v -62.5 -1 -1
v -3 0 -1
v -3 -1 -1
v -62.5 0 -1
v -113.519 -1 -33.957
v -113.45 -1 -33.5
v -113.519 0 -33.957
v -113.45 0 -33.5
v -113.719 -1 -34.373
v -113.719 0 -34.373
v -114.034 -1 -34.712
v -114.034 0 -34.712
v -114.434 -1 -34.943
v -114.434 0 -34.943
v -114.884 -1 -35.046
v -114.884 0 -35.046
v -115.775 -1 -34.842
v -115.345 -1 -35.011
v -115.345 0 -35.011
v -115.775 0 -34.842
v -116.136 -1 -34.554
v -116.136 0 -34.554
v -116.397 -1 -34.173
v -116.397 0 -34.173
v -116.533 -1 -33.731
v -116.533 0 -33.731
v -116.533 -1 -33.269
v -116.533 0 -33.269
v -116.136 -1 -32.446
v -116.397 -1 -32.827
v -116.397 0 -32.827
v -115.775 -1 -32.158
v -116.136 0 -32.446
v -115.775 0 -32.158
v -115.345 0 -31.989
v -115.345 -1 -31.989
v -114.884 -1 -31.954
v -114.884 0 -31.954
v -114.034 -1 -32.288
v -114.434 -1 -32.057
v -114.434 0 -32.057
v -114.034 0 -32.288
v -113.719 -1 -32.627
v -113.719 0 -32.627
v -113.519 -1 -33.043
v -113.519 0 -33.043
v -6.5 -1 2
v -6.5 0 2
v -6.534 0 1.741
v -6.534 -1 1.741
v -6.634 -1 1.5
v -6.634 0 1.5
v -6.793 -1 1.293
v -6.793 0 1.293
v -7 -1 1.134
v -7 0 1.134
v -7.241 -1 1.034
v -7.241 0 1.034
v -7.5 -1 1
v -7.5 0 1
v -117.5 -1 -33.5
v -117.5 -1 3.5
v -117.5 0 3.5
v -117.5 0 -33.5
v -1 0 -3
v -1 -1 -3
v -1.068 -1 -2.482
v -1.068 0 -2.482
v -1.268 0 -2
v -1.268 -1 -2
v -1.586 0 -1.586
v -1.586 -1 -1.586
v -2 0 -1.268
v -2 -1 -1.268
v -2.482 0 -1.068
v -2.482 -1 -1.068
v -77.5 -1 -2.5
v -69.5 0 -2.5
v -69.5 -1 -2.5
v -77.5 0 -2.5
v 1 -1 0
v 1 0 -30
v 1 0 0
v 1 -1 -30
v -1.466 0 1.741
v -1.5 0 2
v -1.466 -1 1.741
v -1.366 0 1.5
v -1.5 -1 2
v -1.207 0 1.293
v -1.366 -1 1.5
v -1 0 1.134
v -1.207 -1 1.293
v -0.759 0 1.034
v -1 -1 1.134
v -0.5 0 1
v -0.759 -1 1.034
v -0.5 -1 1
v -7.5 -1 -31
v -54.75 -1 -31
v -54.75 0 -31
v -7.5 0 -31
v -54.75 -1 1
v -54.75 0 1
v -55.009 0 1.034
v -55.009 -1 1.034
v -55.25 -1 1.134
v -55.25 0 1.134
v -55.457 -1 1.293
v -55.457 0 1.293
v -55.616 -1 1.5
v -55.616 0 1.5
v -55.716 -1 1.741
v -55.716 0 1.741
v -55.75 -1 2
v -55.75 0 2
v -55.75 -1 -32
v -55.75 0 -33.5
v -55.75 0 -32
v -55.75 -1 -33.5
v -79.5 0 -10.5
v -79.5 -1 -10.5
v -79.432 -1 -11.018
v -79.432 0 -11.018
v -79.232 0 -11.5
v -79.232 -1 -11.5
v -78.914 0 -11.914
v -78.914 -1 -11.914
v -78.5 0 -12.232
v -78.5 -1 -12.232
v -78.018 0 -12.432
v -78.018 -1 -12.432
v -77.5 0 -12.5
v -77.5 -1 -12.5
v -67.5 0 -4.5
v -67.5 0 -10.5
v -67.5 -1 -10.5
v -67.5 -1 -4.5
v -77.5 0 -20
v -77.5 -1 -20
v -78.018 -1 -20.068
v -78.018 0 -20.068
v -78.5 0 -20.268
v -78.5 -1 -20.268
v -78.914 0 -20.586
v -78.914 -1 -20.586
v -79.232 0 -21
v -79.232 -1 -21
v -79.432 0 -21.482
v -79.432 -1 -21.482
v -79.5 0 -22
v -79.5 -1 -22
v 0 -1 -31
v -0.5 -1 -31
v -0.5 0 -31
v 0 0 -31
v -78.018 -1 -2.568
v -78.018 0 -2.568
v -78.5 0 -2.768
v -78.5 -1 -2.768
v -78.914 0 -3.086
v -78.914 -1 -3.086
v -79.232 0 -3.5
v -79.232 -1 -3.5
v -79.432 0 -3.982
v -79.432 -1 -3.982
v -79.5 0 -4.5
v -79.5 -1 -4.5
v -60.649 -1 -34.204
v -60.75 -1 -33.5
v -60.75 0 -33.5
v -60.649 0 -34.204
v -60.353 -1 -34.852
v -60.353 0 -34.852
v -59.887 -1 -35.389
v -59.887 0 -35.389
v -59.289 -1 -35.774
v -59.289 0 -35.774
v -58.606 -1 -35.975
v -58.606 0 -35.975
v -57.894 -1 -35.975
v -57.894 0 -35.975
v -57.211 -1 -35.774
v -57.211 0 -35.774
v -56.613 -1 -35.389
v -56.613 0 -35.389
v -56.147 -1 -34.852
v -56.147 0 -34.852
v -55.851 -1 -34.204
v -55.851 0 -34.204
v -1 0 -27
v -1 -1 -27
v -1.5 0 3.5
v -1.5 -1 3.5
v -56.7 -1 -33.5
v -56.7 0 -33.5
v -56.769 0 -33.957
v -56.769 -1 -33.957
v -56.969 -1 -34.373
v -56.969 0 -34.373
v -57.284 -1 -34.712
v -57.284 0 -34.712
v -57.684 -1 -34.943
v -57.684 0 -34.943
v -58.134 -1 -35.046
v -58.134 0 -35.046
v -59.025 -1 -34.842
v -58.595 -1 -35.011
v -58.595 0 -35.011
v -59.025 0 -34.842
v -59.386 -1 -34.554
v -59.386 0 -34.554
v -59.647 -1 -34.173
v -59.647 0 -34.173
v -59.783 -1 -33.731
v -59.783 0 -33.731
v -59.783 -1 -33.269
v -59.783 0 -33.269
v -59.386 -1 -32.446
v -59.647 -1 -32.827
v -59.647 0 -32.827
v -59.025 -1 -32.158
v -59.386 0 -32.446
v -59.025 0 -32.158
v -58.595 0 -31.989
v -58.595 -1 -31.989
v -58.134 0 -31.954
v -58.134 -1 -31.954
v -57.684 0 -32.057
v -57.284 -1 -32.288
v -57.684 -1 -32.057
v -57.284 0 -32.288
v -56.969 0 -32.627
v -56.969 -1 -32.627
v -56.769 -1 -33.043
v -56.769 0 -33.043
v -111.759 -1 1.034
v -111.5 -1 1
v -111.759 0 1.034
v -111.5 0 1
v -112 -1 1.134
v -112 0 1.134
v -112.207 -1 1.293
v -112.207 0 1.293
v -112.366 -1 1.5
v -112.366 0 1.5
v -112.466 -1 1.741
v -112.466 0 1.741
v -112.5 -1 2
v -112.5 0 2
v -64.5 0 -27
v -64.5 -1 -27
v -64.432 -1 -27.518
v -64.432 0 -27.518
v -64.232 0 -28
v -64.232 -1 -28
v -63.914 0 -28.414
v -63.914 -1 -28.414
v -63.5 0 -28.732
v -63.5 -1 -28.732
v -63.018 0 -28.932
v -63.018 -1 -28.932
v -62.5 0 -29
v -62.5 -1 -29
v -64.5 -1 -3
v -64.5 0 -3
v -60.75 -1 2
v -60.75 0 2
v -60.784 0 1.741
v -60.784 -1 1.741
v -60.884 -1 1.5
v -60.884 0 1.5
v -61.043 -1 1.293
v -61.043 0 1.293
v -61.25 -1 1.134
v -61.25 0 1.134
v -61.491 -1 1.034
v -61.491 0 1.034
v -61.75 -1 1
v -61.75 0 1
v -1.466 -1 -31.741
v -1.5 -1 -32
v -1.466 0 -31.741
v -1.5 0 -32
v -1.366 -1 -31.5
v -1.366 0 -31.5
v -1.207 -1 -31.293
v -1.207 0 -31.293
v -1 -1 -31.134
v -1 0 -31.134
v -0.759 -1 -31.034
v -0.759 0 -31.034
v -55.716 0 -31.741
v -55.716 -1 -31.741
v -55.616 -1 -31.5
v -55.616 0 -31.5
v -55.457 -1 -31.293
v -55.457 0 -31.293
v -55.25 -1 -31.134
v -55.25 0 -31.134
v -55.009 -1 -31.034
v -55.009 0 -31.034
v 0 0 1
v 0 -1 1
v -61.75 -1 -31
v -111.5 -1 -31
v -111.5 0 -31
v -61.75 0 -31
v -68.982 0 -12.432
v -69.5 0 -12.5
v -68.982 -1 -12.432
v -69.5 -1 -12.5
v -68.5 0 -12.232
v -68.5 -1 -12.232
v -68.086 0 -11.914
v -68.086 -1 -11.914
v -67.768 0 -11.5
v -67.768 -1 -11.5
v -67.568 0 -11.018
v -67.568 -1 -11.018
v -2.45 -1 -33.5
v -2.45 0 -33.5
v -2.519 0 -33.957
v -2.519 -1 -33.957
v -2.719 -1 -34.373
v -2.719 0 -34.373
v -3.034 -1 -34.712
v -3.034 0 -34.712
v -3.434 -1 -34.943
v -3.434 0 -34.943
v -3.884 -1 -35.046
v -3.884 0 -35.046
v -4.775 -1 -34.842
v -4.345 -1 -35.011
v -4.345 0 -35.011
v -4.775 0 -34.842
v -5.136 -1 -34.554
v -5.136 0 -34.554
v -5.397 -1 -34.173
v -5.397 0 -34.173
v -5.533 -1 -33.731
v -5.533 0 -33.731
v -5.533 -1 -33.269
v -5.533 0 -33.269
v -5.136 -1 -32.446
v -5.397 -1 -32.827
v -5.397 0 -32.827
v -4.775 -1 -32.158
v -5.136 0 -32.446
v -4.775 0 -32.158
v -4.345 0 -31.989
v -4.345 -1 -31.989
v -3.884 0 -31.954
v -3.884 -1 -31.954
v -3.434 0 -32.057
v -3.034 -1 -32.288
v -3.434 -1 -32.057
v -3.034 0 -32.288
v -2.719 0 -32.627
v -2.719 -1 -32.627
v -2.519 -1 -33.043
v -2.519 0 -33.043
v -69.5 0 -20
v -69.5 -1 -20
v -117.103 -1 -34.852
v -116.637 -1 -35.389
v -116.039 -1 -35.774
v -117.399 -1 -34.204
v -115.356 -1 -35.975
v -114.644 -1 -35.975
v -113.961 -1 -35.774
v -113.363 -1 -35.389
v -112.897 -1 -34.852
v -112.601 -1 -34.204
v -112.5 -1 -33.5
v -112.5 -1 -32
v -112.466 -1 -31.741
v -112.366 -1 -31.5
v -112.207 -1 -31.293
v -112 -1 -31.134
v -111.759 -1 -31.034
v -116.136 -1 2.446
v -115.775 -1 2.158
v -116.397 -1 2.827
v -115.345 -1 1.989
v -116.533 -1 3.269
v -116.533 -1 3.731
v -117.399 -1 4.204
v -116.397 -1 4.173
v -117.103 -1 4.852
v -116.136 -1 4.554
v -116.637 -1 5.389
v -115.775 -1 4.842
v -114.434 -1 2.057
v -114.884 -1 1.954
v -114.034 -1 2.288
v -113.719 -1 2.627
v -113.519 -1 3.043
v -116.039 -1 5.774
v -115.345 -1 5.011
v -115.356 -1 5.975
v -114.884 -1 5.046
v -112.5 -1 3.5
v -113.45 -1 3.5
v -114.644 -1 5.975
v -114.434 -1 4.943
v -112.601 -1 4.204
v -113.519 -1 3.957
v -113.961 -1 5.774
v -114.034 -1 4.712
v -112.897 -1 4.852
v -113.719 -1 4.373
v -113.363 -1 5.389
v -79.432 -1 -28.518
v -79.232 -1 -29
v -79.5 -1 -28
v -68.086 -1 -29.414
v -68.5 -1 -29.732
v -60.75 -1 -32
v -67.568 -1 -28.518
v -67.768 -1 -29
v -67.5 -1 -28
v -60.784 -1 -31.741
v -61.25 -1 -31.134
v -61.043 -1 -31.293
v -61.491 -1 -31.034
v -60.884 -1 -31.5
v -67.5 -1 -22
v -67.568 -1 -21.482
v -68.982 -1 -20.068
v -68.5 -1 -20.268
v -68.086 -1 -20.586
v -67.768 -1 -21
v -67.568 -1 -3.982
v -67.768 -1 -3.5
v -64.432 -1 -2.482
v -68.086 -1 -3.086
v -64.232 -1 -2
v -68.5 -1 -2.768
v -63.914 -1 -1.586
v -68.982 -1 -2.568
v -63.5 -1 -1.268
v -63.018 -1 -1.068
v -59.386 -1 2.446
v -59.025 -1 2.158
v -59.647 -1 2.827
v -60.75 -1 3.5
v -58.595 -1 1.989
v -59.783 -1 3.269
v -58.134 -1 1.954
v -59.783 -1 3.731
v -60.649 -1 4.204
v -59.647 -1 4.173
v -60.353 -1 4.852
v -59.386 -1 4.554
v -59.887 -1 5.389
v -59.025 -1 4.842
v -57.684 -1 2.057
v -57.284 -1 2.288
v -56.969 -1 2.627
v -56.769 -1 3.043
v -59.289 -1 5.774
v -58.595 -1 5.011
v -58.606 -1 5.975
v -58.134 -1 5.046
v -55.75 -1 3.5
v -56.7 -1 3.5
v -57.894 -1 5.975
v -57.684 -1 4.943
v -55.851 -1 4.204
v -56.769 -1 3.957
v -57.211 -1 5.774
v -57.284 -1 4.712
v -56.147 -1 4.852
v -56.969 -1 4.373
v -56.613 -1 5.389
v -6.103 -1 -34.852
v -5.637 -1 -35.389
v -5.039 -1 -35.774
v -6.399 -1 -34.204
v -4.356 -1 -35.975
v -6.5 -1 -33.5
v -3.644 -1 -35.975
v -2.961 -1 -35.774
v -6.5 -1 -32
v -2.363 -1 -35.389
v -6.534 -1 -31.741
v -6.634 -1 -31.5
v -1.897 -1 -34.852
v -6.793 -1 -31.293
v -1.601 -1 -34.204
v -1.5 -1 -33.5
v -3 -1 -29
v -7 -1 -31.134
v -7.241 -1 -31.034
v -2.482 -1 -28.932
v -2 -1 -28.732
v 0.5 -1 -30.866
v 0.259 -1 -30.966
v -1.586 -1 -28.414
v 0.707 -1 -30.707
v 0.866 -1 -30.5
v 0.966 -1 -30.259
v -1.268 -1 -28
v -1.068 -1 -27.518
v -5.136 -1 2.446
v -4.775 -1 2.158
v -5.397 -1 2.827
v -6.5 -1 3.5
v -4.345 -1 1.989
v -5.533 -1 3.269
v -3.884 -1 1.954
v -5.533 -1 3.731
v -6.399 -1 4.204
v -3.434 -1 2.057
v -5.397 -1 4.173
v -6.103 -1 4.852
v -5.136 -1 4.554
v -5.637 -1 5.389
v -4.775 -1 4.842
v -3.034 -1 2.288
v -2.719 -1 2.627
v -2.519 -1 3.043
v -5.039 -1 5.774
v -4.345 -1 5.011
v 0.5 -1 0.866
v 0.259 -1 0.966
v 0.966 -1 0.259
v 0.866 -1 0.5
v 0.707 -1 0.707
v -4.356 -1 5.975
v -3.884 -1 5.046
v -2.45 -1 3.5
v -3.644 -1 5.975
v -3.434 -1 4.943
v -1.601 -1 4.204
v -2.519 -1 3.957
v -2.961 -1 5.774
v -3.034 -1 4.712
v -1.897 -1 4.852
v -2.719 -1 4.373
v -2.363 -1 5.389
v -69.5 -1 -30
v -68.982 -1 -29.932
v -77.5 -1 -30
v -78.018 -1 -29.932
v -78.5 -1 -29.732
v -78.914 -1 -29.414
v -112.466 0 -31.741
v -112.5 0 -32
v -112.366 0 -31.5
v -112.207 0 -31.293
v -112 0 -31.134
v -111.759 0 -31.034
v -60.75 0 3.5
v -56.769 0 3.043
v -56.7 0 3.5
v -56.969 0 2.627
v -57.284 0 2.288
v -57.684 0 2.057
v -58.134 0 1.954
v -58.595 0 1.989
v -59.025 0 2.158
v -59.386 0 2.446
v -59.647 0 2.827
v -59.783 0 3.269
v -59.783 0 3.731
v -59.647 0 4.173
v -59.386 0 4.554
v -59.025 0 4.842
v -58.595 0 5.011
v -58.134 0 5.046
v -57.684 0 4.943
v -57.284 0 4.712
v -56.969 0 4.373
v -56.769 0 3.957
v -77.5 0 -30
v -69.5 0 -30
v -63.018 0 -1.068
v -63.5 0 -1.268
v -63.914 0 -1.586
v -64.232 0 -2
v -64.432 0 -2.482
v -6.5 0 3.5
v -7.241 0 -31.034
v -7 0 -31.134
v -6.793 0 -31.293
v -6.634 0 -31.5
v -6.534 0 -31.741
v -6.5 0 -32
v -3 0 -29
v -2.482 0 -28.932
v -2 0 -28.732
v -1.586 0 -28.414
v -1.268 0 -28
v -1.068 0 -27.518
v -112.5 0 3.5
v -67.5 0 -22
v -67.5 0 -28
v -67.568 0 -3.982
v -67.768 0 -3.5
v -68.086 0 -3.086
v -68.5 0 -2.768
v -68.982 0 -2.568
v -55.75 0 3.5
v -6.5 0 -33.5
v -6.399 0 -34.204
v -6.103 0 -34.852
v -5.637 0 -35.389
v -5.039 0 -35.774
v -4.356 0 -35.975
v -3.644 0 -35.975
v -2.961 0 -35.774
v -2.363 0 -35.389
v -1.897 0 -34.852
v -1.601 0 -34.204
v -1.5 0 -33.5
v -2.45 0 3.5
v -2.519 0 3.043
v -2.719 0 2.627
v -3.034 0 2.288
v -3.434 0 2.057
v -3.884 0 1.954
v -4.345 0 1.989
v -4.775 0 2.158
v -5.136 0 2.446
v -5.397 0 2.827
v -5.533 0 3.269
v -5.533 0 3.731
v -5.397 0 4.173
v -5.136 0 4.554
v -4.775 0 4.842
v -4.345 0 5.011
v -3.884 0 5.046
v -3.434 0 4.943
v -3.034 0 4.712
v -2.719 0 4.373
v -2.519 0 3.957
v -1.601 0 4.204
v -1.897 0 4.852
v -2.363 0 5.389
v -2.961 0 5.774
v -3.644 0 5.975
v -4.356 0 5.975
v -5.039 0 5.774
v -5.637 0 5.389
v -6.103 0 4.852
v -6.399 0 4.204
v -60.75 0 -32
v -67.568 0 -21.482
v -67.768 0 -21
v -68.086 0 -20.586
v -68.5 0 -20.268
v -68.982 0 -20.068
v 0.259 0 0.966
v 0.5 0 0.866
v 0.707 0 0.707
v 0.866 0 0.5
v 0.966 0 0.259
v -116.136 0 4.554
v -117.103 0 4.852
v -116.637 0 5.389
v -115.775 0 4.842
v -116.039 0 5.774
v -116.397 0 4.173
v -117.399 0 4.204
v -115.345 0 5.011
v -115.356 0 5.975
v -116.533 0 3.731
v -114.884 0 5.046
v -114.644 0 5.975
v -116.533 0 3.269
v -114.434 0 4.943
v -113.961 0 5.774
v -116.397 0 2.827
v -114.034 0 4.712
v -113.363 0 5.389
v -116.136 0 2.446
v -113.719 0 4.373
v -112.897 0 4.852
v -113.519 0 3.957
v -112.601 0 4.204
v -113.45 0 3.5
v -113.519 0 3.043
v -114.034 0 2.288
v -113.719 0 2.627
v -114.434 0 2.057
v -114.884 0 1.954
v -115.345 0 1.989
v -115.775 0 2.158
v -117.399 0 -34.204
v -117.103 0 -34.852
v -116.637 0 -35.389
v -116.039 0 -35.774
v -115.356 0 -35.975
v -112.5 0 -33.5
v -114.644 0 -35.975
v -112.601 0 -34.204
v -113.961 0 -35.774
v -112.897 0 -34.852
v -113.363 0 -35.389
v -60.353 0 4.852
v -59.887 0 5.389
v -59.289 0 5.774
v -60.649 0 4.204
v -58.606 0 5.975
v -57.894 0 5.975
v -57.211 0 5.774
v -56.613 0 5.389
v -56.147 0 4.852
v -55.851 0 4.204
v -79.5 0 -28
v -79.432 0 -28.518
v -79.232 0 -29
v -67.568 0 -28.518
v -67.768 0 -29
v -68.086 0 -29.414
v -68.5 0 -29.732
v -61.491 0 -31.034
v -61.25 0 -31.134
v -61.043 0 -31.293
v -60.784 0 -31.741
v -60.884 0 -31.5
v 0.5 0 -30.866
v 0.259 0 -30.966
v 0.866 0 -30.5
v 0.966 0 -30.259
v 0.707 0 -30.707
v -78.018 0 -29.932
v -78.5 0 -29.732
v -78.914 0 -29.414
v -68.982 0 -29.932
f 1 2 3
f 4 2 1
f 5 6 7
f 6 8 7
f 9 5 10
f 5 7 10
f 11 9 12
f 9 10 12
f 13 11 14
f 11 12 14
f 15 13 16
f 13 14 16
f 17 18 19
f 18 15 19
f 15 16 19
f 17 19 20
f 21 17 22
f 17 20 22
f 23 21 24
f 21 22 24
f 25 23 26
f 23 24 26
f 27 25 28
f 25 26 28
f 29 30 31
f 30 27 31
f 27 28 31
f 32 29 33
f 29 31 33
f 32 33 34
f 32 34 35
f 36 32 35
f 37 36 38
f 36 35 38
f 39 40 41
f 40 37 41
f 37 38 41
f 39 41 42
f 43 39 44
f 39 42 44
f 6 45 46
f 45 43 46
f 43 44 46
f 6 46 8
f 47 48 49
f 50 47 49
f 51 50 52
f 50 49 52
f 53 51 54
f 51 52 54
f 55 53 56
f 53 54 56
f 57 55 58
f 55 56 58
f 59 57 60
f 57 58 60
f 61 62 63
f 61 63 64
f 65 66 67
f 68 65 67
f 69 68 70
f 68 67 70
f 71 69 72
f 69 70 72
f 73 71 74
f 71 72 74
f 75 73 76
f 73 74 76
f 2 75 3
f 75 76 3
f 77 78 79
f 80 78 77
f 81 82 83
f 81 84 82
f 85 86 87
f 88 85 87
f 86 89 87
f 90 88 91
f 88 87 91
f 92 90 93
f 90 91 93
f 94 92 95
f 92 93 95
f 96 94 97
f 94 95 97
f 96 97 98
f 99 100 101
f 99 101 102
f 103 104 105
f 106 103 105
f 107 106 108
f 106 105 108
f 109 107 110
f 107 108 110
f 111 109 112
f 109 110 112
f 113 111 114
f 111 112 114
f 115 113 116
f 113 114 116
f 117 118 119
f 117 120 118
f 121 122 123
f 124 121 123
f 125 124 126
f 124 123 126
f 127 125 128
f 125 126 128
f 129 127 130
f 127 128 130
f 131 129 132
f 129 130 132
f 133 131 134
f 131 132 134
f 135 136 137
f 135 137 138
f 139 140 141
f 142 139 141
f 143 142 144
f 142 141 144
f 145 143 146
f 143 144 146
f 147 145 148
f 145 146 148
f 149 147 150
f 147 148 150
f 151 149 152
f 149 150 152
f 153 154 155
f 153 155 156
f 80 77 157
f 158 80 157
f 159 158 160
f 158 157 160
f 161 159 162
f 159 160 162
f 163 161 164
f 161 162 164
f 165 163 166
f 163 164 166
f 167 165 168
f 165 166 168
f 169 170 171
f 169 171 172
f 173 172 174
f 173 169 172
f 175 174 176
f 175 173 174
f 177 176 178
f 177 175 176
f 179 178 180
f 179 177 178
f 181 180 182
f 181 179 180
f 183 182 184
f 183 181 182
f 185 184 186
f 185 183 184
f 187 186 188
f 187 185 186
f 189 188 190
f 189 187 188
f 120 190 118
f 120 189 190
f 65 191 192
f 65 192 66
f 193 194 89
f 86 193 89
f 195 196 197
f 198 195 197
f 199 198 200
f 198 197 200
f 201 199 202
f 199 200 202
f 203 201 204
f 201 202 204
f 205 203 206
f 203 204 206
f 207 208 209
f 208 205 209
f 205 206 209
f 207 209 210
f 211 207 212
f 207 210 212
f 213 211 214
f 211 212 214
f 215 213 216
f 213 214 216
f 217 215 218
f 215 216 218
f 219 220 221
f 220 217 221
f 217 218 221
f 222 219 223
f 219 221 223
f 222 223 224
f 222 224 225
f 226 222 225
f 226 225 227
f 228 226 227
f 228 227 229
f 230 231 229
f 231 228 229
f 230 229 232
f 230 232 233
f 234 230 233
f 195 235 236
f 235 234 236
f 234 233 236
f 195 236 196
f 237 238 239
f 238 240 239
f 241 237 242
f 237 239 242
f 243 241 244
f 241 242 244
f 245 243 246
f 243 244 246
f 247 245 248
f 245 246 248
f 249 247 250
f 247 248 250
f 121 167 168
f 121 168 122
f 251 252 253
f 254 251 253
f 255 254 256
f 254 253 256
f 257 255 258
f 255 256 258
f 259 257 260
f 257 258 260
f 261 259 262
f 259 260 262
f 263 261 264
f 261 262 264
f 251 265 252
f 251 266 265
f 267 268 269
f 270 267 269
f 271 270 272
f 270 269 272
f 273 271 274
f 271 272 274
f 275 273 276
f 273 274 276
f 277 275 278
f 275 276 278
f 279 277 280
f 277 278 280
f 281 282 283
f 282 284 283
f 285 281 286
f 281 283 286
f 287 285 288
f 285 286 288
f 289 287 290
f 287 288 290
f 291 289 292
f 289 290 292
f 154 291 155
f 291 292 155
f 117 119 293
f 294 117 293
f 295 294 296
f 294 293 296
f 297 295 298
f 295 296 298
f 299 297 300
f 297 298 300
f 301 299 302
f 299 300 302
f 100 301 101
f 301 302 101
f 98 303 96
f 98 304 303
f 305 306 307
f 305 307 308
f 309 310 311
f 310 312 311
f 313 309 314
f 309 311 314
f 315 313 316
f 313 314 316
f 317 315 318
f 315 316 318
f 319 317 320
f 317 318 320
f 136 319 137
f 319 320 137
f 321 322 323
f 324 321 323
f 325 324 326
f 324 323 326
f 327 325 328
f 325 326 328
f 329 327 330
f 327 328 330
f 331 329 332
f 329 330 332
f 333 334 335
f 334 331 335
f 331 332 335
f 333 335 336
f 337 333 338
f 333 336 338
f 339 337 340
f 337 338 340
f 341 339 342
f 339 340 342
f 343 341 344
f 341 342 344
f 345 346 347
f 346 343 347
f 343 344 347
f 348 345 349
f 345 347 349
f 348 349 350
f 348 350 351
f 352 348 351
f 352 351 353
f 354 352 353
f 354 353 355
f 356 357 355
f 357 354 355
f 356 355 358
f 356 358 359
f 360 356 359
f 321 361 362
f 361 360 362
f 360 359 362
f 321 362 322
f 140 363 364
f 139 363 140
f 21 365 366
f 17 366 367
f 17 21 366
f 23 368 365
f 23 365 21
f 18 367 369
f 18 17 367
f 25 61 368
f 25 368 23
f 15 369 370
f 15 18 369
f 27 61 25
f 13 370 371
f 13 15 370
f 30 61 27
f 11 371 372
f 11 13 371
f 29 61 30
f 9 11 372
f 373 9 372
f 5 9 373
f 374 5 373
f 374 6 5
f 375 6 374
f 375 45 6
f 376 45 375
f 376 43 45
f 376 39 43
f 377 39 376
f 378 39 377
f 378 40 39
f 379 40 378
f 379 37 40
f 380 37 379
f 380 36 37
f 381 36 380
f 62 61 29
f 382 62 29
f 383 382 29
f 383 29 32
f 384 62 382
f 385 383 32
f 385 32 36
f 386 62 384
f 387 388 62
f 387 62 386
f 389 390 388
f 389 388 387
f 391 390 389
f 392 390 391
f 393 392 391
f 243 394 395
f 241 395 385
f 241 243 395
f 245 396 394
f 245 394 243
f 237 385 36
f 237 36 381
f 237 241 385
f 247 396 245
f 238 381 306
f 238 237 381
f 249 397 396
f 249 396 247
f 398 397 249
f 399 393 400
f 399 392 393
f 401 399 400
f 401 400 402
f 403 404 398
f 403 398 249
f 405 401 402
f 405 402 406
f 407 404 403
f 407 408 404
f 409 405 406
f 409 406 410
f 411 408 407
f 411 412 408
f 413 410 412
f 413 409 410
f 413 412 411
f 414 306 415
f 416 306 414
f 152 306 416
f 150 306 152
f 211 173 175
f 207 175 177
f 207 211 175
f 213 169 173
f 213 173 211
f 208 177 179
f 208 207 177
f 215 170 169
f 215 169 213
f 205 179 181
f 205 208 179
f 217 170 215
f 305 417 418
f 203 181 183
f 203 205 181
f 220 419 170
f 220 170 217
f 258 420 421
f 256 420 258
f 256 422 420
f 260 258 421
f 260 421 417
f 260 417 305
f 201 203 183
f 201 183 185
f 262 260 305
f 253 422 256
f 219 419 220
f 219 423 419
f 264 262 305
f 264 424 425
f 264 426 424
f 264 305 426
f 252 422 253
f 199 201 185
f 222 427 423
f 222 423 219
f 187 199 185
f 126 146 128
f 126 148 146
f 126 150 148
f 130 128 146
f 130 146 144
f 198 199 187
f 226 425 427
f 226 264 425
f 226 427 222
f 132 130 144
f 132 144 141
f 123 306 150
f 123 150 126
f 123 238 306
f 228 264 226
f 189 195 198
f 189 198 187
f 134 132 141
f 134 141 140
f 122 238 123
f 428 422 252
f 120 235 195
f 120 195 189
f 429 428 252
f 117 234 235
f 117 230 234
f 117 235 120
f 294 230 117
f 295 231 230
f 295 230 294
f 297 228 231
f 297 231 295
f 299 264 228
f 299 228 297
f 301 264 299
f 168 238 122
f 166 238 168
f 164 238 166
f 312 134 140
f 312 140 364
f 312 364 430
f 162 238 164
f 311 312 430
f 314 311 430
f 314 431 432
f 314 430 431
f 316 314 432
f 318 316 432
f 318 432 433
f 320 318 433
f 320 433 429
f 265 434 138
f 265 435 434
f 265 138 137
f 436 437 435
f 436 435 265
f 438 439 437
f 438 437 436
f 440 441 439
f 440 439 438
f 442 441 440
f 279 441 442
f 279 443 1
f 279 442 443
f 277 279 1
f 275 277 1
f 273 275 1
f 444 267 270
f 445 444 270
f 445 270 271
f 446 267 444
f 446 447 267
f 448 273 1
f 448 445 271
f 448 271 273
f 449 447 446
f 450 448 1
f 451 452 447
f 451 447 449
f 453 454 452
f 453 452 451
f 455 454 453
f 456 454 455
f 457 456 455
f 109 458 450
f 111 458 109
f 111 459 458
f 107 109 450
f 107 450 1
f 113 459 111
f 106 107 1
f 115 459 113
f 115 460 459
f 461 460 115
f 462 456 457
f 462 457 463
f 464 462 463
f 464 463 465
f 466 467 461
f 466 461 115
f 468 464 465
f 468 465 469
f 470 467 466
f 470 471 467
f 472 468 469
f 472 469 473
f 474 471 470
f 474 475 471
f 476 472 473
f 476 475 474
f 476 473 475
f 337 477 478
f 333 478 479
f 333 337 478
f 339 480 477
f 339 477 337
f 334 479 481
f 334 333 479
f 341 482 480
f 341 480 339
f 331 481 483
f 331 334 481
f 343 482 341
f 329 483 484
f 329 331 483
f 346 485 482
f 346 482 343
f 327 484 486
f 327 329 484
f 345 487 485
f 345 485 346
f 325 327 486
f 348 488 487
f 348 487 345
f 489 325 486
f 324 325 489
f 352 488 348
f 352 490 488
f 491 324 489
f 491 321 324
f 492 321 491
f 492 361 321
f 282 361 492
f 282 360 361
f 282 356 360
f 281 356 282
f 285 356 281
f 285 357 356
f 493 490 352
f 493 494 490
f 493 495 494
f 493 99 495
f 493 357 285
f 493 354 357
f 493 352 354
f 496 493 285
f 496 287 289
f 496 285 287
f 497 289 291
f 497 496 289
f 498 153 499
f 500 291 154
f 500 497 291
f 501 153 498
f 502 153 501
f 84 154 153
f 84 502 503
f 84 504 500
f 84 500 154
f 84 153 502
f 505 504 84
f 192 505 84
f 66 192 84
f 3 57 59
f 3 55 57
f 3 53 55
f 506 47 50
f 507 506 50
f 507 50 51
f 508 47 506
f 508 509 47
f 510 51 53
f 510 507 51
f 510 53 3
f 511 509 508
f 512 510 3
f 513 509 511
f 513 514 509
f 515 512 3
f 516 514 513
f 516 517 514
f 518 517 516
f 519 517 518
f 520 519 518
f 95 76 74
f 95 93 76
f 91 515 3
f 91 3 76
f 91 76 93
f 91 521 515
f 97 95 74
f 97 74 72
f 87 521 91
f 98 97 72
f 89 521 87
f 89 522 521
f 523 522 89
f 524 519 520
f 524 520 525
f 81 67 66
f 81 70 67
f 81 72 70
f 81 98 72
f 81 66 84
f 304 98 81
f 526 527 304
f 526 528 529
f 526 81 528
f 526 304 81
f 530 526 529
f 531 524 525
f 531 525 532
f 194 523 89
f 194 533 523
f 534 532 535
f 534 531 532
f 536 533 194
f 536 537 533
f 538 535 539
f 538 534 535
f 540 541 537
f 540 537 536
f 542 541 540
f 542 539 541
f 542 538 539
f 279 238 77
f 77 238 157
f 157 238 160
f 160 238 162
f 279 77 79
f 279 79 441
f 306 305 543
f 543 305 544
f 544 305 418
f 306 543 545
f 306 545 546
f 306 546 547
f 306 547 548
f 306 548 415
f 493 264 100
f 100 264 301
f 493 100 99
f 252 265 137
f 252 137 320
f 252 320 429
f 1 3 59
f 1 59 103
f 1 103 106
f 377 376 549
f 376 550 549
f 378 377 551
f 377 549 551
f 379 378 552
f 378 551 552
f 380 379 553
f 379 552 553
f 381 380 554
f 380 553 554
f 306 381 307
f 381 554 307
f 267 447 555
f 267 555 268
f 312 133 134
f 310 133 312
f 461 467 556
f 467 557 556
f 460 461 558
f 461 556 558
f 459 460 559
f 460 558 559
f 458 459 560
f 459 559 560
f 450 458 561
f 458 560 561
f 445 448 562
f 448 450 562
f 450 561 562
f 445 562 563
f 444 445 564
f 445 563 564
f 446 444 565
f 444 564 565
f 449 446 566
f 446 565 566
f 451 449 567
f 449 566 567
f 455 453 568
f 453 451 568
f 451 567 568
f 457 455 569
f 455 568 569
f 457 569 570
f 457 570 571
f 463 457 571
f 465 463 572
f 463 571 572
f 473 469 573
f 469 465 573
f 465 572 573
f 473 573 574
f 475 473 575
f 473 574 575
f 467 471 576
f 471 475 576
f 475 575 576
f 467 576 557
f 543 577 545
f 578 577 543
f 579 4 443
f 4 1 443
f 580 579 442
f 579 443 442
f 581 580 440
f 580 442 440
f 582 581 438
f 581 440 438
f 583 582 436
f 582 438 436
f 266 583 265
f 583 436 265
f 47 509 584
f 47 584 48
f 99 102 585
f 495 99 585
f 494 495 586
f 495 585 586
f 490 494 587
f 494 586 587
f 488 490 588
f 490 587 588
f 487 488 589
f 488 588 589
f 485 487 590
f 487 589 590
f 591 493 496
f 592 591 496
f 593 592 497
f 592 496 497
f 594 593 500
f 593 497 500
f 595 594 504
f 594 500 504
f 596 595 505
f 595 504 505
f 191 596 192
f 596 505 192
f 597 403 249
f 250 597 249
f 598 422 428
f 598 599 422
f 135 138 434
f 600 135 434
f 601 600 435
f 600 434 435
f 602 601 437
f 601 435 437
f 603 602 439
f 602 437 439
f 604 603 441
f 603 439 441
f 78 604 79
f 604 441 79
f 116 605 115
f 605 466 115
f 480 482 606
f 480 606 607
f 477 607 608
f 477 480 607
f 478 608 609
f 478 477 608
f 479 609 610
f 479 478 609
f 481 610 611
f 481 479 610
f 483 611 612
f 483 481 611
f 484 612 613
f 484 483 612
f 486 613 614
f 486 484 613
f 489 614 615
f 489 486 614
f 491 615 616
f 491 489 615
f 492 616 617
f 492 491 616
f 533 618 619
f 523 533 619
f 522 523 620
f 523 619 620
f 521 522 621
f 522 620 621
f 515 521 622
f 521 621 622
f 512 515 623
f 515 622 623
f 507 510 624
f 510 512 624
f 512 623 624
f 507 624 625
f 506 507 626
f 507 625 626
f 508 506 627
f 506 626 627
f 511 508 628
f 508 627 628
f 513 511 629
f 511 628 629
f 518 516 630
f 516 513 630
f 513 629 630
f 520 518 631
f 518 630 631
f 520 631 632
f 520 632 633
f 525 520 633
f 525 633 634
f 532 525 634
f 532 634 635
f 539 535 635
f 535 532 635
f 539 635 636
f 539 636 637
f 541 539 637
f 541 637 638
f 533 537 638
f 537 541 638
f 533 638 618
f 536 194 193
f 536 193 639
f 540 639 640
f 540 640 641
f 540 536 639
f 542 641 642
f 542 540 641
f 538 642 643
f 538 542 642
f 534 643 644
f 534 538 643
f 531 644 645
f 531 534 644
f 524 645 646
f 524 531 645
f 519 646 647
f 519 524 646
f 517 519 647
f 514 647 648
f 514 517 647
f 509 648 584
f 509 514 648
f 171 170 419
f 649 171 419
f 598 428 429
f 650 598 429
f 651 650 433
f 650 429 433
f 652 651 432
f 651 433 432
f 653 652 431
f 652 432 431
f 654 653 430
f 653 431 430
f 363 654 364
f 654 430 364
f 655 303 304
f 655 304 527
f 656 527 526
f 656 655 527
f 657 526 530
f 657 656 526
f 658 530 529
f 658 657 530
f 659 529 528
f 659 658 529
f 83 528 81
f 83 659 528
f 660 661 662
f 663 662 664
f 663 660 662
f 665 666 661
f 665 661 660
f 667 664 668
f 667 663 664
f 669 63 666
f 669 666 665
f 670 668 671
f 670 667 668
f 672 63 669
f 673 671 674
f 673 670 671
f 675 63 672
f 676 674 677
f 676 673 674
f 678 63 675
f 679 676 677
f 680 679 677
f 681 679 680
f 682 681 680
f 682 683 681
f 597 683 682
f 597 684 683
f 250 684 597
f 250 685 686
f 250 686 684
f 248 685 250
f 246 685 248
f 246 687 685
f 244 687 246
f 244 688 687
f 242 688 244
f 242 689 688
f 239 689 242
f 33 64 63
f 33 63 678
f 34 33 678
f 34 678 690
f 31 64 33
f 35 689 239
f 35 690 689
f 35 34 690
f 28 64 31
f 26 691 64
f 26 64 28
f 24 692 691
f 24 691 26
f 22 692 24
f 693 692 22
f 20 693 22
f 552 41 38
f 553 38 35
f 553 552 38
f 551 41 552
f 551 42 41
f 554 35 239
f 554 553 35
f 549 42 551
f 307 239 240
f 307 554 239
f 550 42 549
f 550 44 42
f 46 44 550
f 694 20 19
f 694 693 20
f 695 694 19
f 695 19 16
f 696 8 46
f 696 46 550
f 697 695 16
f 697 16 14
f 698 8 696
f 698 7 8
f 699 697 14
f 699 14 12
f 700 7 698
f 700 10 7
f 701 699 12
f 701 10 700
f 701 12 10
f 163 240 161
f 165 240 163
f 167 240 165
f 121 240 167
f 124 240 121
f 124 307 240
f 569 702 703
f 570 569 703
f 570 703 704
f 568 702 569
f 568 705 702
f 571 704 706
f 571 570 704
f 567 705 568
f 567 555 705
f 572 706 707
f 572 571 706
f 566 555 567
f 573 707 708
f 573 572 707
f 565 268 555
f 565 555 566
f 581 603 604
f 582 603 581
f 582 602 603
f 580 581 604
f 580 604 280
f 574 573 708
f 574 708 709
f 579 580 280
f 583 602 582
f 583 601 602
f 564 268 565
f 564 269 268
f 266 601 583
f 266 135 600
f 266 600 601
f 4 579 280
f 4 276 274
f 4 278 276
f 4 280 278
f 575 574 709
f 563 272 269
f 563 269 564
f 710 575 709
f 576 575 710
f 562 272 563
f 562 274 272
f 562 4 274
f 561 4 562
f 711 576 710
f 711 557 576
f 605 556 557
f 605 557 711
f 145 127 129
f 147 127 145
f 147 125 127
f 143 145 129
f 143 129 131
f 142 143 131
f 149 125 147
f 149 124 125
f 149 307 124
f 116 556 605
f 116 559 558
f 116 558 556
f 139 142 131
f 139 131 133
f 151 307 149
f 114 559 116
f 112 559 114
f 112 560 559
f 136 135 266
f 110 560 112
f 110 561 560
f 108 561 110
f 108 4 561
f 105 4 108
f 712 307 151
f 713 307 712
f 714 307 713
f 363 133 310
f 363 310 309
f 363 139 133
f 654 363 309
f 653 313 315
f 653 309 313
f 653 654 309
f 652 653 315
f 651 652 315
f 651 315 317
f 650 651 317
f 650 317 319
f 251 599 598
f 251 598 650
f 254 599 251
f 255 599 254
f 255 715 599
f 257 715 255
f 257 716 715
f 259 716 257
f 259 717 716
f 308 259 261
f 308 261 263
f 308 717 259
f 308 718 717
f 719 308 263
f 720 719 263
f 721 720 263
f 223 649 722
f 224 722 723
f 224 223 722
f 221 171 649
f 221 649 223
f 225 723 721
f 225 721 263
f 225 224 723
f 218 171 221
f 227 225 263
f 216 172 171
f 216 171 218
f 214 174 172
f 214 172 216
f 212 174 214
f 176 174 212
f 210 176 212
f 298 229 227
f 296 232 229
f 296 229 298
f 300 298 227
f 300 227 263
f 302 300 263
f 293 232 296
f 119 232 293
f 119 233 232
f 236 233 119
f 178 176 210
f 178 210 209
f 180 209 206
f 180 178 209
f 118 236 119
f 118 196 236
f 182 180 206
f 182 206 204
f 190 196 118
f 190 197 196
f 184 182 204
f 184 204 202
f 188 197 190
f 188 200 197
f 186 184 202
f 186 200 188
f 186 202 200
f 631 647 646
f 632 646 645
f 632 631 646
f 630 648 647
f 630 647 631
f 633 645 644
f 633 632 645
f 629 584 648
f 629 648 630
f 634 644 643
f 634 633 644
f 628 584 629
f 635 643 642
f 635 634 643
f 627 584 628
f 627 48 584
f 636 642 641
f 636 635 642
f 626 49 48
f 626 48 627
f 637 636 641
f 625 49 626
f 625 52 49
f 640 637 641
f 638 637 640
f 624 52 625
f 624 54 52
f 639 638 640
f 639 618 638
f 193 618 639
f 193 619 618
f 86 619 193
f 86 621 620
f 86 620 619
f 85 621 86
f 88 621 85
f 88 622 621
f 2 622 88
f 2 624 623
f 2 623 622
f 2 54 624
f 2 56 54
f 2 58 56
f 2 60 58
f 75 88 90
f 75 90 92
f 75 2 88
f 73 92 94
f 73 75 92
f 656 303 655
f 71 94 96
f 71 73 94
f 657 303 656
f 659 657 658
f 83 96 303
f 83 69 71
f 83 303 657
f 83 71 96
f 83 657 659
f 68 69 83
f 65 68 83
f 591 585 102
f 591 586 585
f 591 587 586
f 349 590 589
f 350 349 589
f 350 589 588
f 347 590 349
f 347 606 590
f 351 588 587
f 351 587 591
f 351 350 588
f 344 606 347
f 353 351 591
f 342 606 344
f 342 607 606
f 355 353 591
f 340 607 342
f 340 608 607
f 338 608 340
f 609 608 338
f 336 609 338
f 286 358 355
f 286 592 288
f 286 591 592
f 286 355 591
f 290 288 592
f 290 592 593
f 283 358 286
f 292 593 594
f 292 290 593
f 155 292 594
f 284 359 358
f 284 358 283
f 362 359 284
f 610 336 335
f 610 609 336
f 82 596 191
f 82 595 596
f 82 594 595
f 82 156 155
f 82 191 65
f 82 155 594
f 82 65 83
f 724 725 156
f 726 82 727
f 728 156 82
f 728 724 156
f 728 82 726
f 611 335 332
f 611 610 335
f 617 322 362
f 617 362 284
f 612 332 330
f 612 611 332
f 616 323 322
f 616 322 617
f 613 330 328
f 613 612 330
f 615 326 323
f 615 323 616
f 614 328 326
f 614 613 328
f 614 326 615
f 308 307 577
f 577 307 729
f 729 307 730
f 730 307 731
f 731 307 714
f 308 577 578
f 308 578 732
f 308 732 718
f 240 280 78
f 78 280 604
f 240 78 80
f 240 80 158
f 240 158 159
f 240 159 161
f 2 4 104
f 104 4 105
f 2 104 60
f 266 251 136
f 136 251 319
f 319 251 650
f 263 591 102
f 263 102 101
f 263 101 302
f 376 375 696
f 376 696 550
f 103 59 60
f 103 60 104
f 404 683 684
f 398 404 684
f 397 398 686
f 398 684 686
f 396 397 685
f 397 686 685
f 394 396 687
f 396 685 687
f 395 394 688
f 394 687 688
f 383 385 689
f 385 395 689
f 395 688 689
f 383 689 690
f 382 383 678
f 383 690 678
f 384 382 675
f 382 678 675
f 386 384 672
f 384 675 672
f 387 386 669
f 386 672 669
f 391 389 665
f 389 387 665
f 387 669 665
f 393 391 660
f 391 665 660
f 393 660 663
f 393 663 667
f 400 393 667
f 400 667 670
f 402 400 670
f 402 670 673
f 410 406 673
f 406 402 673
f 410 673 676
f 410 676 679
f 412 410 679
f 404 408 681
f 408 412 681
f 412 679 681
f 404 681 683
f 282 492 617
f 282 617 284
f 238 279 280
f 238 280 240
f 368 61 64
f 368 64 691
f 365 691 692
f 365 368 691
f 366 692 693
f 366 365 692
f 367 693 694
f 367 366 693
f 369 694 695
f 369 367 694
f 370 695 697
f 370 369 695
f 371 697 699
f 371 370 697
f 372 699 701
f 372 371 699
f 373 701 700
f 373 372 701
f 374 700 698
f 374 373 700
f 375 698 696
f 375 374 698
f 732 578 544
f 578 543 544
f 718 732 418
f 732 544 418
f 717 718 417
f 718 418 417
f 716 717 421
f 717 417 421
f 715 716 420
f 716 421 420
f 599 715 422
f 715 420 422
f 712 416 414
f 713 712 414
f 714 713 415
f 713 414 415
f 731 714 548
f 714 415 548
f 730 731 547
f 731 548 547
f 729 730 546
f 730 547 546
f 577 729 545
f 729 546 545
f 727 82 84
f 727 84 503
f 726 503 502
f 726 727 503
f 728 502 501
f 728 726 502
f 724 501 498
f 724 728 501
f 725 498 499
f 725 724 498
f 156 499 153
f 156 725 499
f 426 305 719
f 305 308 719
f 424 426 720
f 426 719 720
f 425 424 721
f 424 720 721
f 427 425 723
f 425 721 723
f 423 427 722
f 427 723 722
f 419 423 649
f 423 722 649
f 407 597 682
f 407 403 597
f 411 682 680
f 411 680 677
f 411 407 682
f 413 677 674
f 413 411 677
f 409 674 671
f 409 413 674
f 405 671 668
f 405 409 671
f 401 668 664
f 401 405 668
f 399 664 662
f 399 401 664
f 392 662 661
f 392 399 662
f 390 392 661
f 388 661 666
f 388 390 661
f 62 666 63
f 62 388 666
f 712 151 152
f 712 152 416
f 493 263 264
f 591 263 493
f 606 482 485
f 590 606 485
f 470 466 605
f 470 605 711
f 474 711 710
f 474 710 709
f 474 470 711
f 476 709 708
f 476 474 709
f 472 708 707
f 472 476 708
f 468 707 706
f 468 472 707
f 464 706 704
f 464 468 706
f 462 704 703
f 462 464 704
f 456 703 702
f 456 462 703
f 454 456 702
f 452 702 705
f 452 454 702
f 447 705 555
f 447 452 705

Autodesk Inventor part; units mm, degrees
ref_plane "YZ Plane" through (0, 0, 0) normal (1, 0, 0) x (0, 1, 0)
ref_plane "XZ Plane" through (0, 0, 0) normal (0, 1, 0) x (-1, 0, 0)
ref_plane "XY Plane" through (0, 0, 0) normal (0, 0, 1) x (1, 0, 0)
sketch "Sketch1" plane through (0, 0, 0) normal (0, 1, 0) x (-1, 0, 0)
  line L0 (0, 0) -> (37, 0) construction
  line L1 (37, 0) -> (37, -30) construction
  line L2 (37, -30) -> (0, -30) construction
  line L3 (0, -30) -> (0, 0) construction
  line L4 (75.5, -6) -> (38, -6) construction
  line L5 (38, -6) -> (38, -24) construction
  line L6 (38, -24) -> (75.5, -24) construction
  line L7 (75.5, -24) -> (75.5, -6) construction
  line L8 (94, 0) -> (76.5, 0) construction
  line L9 (76.5, 0) -> (76.5, -28) construction
  line L10 (76.5, -28) -> (94, -28) construction
  line L11 (94, -28) -> (94, 0) construction
  line L12 (-1, 1) -> (117.5, 1)
  line L13 (117.5, 1) -> (117.5, -31)
  line L14 (117.5, -31) -> (-1, -31)
  line L15 (-1, -31) -> (-1, 1)
  line L16 (0, 0) -> (94, 0)
  line L17 (94, 0) -> (94, -30)
  line L18 (94, -30) -> (0, -30)
  line L19 (0, -30) -> (0, 0)
  line L20 (38, -8) -> (37, -8)
  line L21 (37, -8) -> (37, -22)
  line L22 (37, -22) -> (38, -22)
  line L23 (38, -22) -> (38, -8)
  line L24 (73.5, -6) -> (40, -6)
  line L25 (40, -6) -> (40, -5)
  line L26 (40, -5) -> (73.5, -5)
  line L27 (73.5, -5) -> (73.5, -6)
  line L28 (73.5, -24) -> (40, -24)
  line L29 (40, -24) -> (40, -25)
  line L30 (40, -25) -> (73.5, -25)
  line L31 (73.5, -25) -> (73.5, -24)
  line L32 (76.5, -8) -> (75.5, -8)
  line L33 (75.5, -8) -> (75.5, -22)
  line L34 (75.5, -22) -> (76.5, -22)
  line L35 (76.5, -22) -> (76.5, -8)
  line L36 (115, -31) -> (115, -33.5) construction
  line L37 (58.25, -31) -> (58.25, -33.5) construction
  line L38 (4, -31) -> (4, -33.5) construction
  line L39 (115, 1) -> (115, 3.5) construction
  line L40 (58.25, 1) -> (58.25, 3.5) construction
  line L41 (4, 1) -> (4, 3.5) construction
  circle A0 centre (115, -33.5) radius 2.5
  circle A1 centre (58.25, -33.5) radius 2.5
  circle A2 centre (4, -33.5) radius 2.5
  circle A3 centre (4, 3.5) radius 2.5
  circle A4 centre (58.25, 3.5) radius 2.5
  circle A5 centre (115, 3.5) radius 2.5
  line L42 (117.5, 1) -> (117.5, 3.5)
  line L43 (112.5, 3.5) -> (112.5, 1)
  line L44 (60.75, 3.5) -> (60.75, 1)
  line L45 (55.75, 3.5) -> (55.75, 1)
  line L46 (6.5, 3.5) -> (6.5, 1)
  line L47 (1.5, 3.5) -> (1.5, 1)
  line L48 (1.5, -33.5) -> (1.5, -31)
  line L49 (6.5, -33.5) -> (6.5, -31)
  line L50 (55.75, -33.5) -> (55.75, -31)
  line L51 (60.75, -33.5) -> (60.75, -31)
  line L52 (117.5, -33.5) -> (117.5, -31)
  line L53 (112.5, -33.5) -> (112.5, -31)
  circle A6 centre (115, -33.5) radius 1.55
  circle A7 centre (58.25, -33.5) radius 1.55
  circle A8 centre (4, -33.5) radius 1.55
  circle A9 centre (4, 3.5) radius 1.55
  circle A10 centre (58.25, 3.5) radius 1.55
  circle A11 centre (115, 3.5) radius 1.55
  line L54 (57.75, -30) -> (58.75, -30)
  line L55 (58.75, -30) -> (58.75, -25)
  line L56 (58.75, -25) -> (57.75, -25)
  line L57 (57.75, -25) -> (57.75, -30)
  line L58 (57.75, -5) -> (58.75, -5)
  line L59 (58.75, -5) -> (58.75, 0)
  line L60 (58.75, 0) -> (57.75, 0)
  line L61 (57.75, 0) -> (57.75, -5)
  line L62 (40, -25) -> (41, -25)
  line L63 (41, -25) -> (41, -30)
  line L64 (41, -30) -> (40, -30)
  line L65 (40, -30) -> (40, -25)
  line L66 (40, -5) -> (41, -5)
  line L67 (41, -5) -> (41, 0)
  line L68 (41, 0) -> (40, 0)
  line L69 (40, 0) -> (40, -5)
  line L70 (73.5, -5) -> (72.5, -5)
  line L71 (72.5, -5) -> (72.5, 0)
  line L72 (72.5, 0) -> (73.5, 0)
  line L73 (73.5, 0) -> (73.5, -5)
  line L74 (73.5, -25) -> (72.5, -25)
  line L75 (72.5, -25) -> (72.5, -30)
  line L76 (72.5, -30) -> (73.5, -30)
  line L77 (73.5, -30) -> (73.5, -25)
  dimension "d0" = 37
  dimension "d1" = 30
  dimension "d2" = 18
  dimension "d3" = 37.5
  dimension "d4" = 1
  dimension "d5" = 6
  dimension "d6" = 17.5
  dimension "d7" = 28
  dimension "d8" = 1
  dimension "d9" = 1
  dimension "d10" = 1
  dimension "d11" = 1
  dimension "d12" = 117.5
  dimension "d13" = 2
  dimension "d14" = 2
  dimension "d15" = 1
  dimension "d16" = 1
  dimension "d17" = 2
  dimension "d18" = 2
  dimension "d19" = 2
  dimension "d20" = 2
  dimension "d21" = 2.5
  dimension "d22" = 2.5
  dimension "d23" = 5
  dimension "d24" = 2.5
  dimension "d25" = 2.5
  dimension "d26" = 2.5
  dimension "d27" = 2.5
  dimension "d28" = 5
  dimension "d29" = 5
  dimension "d30" = 2.5
  dimension "d31" = 3.1
  dimension "d32" = 3.1
  dimension "d33" = 3.1
  dimension "d34" = 3.1
  dimension "d35" = 3.1
  dimension "d36" = 3.1
  dimension "d44" = 1
  dimension "d45" = 1
  dimension "d46" = 0.5
  dimension "d47" = 0
  dimension "d48" = 1
  dimension "d49" = 1
  dimension "d50" = 1
  dimension "d51" = 1
extrude "Extrusion1" add sketch "Sketch1" along normal blind 7 contours L12 L13 L14 L15 | L47 A3 L12 | A3 L46 L12 | A3 | L14 A2 L48 | L14 L49 A2 | A2 | L45 A4 L12 | A4 L44 L12 | A4 | L14 A1 L50 | L14 L51 A1 | A1 | L43 A5 L12 | A5 L42 L12 | A5 | L14 A0 L53 | L14 L52 A0 | A0 | L16 L67 L26 L69 | L26 L27 L24 L25 | L65 L30 L63 L18 | L16 L59 L26 L61 | L29 L28 L31 L30 | L57 L30 L55 L18 | L16 L73 L26 L71 | L75 L30 L77 L18 | L23 L22 L21 L20 | L35 L34 L33 L32
sketch "Sketch2" plane through (0, 0, 0) normal (0, -1, 0) x (1, 0, 0)
  line L0 (-117.5, -33.5) -> (-117.5, 3.5) projected
  arc A0 (-117.5, -33.5) -> (-112.5, -33.5) centre (-115, -33.5) ccw projected
  line L1 (-112.5, -31) -> (-112.5, -33.5) projected
  line L2 (-60.75, -31) -> (-112.5, -31) projected
  line L3 (-60.75, -33.5) -> (-60.75, -31) projected
  arc A1 (-60.75, -33.5) -> (-55.75, -33.5) centre (-58.25, -33.5) ccw projected
  line L4 (-55.75, -31) -> (-55.75, -33.5) projected
  line L5 (-6.5, -31) -> (-55.75, -31) projected
  line L6 (-6.5, -33.5) -> (-6.5, -31) projected
  arc A2 (-6.5, -33.5) -> (-1.5, -33.5) centre (-4, -33.5) ccw projected
  line L7 (-1.5, -31) -> (-1.5, -33.5) projected
  line L8 (1, -31) -> (-1.5, -31) projected
  line L9 (1, 1) -> (1, -31) projected
  line L10 (-1.5, 1) -> (1, 1) projected
  line L11 (-1.5, 3.5) -> (-1.5, 1) projected
  arc A3 (-1.5, 3.5) -> (-6.5, 3.5) centre (-4, 3.5) ccw projected
  line L12 (-6.5, 1) -> (-6.5, 3.5) projected
  line L13 (-55.75, 1) -> (-6.5, 1) projected
  line L14 (-55.75, 3.5) -> (-55.75, 1) projected
  arc A4 (-55.75, 3.5) -> (-60.75, 3.5) centre (-58.25, 3.5) ccw projected
  line L15 (-60.75, 1) -> (-60.75, 3.5) projected
  line L16 (-112.5, 1) -> (-60.75, 1) projected
  line L17 (-112.5, 3.5) -> (-112.5, 1) projected
  arc A5 (-112.5, 3.5) -> (-117.5, 3.5) centre (-115, 3.5) ccw projected
  circle A6 centre (-58.25, 3.5) radius 1.55 projected
  circle A7 centre (-4, 3.5) radius 1.55 projected
  circle A8 centre (-4, -33.5) radius 1.55 projected
  circle A9 centre (-58.25, -33.5) radius 1.55 projected
  circle A10 centre (-115, 3.5) radius 1.55 projected
  circle A11 centre (-115, -33.5) radius 1.55 projected
  line L18 (-41, 0) -> (-57.75, 0) projected
  line L19 (0, -30) -> (0, 0) projected
  line L20 (-57.75, -30) -> (-41, -30) projected
  line L21 (-94, 0) -> (-94, -30) projected
  line L22 (-41, -5) -> (-41, 0) projected
  line L23 (-57.75, -5) -> (-41, -5) projected
  line L24 (-57.75, 0) -> (-57.75, -5) projected
  line L25 (-41, -30) -> (-41, -25) projected
  line L26 (-57.75, -25) -> (-57.75, -30) projected
  line L27 (-41, -25) -> (-57.75, -25) projected
  line L28 (-72.5, -25) -> (-72.5, -30) projected
  line L29 (-58.75, -25) -> (-72.5, -25) projected
  line L30 (-58.75, -30) -> (-58.75, -25) projected
  line L31 (-72.5, -30) -> (-58.75, -30) projected
  line L32 (-72.5, 0) -> (-72.5, -5) projected
  line L33 (-58.75, 0) -> (-72.5, 0) projected
  line L34 (-58.75, -5) -> (-58.75, 0) projected
  line L35 (-72.5, -5) -> (-58.75, -5) projected
  line L36 (-73.5, 0) -> (-94, 0) projected
  line L37 (-73.5, -6) -> (-73.5, 0) projected
  line L38 (-40, -6) -> (-73.5, -6) projected
  line L39 (-40, 0) -> (-40, -6) projected
  line L40 (0, 0) -> (-40, 0) projected
  line L41 (-40, -30) -> (0, -30) projected
  line L42 (-40, -24) -> (-40, -30) projected
  line L43 (-73.5, -24) -> (-40, -24) projected
  line L44 (-73.5, -30) -> (-73.5, -24) projected
  line L45 (-94, -30) -> (-73.5, -30) projected
extrude "Extrusion2" add sketch "Sketch2" along normal blind 1 contours L0 A5 L17 L16 L15 A4 L14 L13 L12 A3 L11 L10 L9 L8 L7 A2 L6 L5 L4 A1 L3 L2 L1 A0 | L22 L23 L24 L18 | L41 L42 L43 L44 L45 L21 L36 L37 L38 L39 L40 L19 | L26 L27 L25 L20 | L29 L30 L31 L28 | L33 L34 L35 L32
fillet "Fillet2" radius 1 32 edges at (-73.5, 3.5, -6) (-73.5, 3.5, -24) (-40, 3.5, -24) (1, 3, -31) (-1.5, 3, -31) (1, 3, 1) (-55.75, 3, -31) (-1.5, 3, 1) (-55.75, 3, 1) (-112.5, 3, 1) (-112.5, 3, -31) (-60.75, 3, -31) (-6.5, 3, -31) (-60.75, 3, 1) (-6.5, 3, 1) (-40, 3.5, -6) (-72.5, 3.5, 0) (-57.75, 3.5, 0) (-72.5, 3.5, -25) (-57.75, 3.5, -25) (-41, 3.5, -25) (-58.75, 3.5, -25) (-41, 3.5, 0) (-58.75, 3.5, 0) (-72.5, 3.5, -30) (-57.75, 3.5, -30) (-57.75, 3.5, -5) (-72.5, 3.5, -5) (-41, 3.5, -5) (-58.75, 3.5, -5) (-58.75, 3.5, -30) (-41, 3.5, -30)
sketch "Sketch5" plane through (0, 7, 0) normal (0, 1, 0) x (1, 0, 0)
  line L0 (-120.447, 38.9055) -> (3.6698, 38.9055)
  line L1 (3.6698, 38.9055) -> (3.6698, -10.7705)
  line L2 (3.6698, -10.7705) -> (-120.447, -10.7705)
  line L3 (-120.447, -10.7705) -> (-120.447, 38.9055)
  point P0 (0, 0)
extrude "Extrusion5" cut sketch "Sketch5" against normal blind 7
sketch "Sketch13" plane through (0, 0, 0) normal (0, 1, 0) x (1, 0, 0)
  line L0 (-64.5, 29) -> (-1, 29)
  line L1 (-1, 29) -> (-1, 1)
  line L2 (-1, 1) -> (-64.5, 1)
  line L3 (-64.5, 1) -> (-64.5, 29)
  line L4 (1, 30) -> (1, 0) projected
  line L5 (-54.75, 31) -> (-7.5, 31) projected
  line L6 (-7.5, -1) -> (-54.75, -1) projected
  line L7 (-117.5, -3.5) -> (-117.5, 33.5) projected
  line L8 (-79.5, 30) -> (-67.5, 30)
  line L9 (-67.5, 30) -> (-67.5, 20)
  line L10 (-67.5, 20) -> (-79.5, 20)
  line L11 (-79.5, 20) -> (-79.5, 30)
  line L12 (-79.5, 12.5) -> (-67.5, 12.5)
  line L13 (-67.5, 12.5) -> (-67.5, 2.5)
  line L14 (-67.5, 2.5) -> (-79.5, 2.5)
  line L15 (-79.5, 2.5) -> (-79.5, 12.5)
  line L16 (-111.5, 31) -> (-61.75, 31) projected
  line L17 (-61.75, -1) -> (-111.5, -1) projected
  line L18 (-76.1794, 28.5) -> (-69.1572, 28.5) construction
  line L19 (-69.1572, 28.5) -> (-69.1572, 21.5) construction
  line L20 (-69.1572, 21.5) -> (-76.1794, 21.5) construction
  line L21 (-76.1794, 21.5) -> (-76.1794, 28.5) construction
  point P0 (0, 0)
  point P1 (-79.5, 25)
  point P2 (-79.5, 7.5)
  point P3 (-67.5, 25)
  point P4 (-67.5, 7.5)
  dimension "d114" = 2
  dimension "d115" = 2
  dimension "d116" = 2
  dimension "d117" = 53
  dimension "d118" = 50
  dimension "d119" = 12
  dimension "d120" = 1
  dimension "d121" = 3.5
  dimension "d122" = 13.5
  dimension "d123" = 11
  dimension "d127" = 2.5
  dimension "d128" = 9.5
extrude "Extrusion15" cut sketch "Sketch13" against normal through all
fillet "Fillet4" radius 2 12 edges at (-64.5, -0.5, -29) (-79.5, -0.5, -30) (-79.5, -0.5, -12.5) (-1, -0.5, -29) (-1, -0.5, -1) (-67.5, -0.5, -2.5) (-67.5, -0.5, -20) (-64.5, -0.5, -1) (-79.5, -0.5, -2.5) (-79.5, -0.5, -20) (-67.5, -0.5, -30) (-67.5, -0.5, -12.5)
properties part number "frontpackCOVER1"
